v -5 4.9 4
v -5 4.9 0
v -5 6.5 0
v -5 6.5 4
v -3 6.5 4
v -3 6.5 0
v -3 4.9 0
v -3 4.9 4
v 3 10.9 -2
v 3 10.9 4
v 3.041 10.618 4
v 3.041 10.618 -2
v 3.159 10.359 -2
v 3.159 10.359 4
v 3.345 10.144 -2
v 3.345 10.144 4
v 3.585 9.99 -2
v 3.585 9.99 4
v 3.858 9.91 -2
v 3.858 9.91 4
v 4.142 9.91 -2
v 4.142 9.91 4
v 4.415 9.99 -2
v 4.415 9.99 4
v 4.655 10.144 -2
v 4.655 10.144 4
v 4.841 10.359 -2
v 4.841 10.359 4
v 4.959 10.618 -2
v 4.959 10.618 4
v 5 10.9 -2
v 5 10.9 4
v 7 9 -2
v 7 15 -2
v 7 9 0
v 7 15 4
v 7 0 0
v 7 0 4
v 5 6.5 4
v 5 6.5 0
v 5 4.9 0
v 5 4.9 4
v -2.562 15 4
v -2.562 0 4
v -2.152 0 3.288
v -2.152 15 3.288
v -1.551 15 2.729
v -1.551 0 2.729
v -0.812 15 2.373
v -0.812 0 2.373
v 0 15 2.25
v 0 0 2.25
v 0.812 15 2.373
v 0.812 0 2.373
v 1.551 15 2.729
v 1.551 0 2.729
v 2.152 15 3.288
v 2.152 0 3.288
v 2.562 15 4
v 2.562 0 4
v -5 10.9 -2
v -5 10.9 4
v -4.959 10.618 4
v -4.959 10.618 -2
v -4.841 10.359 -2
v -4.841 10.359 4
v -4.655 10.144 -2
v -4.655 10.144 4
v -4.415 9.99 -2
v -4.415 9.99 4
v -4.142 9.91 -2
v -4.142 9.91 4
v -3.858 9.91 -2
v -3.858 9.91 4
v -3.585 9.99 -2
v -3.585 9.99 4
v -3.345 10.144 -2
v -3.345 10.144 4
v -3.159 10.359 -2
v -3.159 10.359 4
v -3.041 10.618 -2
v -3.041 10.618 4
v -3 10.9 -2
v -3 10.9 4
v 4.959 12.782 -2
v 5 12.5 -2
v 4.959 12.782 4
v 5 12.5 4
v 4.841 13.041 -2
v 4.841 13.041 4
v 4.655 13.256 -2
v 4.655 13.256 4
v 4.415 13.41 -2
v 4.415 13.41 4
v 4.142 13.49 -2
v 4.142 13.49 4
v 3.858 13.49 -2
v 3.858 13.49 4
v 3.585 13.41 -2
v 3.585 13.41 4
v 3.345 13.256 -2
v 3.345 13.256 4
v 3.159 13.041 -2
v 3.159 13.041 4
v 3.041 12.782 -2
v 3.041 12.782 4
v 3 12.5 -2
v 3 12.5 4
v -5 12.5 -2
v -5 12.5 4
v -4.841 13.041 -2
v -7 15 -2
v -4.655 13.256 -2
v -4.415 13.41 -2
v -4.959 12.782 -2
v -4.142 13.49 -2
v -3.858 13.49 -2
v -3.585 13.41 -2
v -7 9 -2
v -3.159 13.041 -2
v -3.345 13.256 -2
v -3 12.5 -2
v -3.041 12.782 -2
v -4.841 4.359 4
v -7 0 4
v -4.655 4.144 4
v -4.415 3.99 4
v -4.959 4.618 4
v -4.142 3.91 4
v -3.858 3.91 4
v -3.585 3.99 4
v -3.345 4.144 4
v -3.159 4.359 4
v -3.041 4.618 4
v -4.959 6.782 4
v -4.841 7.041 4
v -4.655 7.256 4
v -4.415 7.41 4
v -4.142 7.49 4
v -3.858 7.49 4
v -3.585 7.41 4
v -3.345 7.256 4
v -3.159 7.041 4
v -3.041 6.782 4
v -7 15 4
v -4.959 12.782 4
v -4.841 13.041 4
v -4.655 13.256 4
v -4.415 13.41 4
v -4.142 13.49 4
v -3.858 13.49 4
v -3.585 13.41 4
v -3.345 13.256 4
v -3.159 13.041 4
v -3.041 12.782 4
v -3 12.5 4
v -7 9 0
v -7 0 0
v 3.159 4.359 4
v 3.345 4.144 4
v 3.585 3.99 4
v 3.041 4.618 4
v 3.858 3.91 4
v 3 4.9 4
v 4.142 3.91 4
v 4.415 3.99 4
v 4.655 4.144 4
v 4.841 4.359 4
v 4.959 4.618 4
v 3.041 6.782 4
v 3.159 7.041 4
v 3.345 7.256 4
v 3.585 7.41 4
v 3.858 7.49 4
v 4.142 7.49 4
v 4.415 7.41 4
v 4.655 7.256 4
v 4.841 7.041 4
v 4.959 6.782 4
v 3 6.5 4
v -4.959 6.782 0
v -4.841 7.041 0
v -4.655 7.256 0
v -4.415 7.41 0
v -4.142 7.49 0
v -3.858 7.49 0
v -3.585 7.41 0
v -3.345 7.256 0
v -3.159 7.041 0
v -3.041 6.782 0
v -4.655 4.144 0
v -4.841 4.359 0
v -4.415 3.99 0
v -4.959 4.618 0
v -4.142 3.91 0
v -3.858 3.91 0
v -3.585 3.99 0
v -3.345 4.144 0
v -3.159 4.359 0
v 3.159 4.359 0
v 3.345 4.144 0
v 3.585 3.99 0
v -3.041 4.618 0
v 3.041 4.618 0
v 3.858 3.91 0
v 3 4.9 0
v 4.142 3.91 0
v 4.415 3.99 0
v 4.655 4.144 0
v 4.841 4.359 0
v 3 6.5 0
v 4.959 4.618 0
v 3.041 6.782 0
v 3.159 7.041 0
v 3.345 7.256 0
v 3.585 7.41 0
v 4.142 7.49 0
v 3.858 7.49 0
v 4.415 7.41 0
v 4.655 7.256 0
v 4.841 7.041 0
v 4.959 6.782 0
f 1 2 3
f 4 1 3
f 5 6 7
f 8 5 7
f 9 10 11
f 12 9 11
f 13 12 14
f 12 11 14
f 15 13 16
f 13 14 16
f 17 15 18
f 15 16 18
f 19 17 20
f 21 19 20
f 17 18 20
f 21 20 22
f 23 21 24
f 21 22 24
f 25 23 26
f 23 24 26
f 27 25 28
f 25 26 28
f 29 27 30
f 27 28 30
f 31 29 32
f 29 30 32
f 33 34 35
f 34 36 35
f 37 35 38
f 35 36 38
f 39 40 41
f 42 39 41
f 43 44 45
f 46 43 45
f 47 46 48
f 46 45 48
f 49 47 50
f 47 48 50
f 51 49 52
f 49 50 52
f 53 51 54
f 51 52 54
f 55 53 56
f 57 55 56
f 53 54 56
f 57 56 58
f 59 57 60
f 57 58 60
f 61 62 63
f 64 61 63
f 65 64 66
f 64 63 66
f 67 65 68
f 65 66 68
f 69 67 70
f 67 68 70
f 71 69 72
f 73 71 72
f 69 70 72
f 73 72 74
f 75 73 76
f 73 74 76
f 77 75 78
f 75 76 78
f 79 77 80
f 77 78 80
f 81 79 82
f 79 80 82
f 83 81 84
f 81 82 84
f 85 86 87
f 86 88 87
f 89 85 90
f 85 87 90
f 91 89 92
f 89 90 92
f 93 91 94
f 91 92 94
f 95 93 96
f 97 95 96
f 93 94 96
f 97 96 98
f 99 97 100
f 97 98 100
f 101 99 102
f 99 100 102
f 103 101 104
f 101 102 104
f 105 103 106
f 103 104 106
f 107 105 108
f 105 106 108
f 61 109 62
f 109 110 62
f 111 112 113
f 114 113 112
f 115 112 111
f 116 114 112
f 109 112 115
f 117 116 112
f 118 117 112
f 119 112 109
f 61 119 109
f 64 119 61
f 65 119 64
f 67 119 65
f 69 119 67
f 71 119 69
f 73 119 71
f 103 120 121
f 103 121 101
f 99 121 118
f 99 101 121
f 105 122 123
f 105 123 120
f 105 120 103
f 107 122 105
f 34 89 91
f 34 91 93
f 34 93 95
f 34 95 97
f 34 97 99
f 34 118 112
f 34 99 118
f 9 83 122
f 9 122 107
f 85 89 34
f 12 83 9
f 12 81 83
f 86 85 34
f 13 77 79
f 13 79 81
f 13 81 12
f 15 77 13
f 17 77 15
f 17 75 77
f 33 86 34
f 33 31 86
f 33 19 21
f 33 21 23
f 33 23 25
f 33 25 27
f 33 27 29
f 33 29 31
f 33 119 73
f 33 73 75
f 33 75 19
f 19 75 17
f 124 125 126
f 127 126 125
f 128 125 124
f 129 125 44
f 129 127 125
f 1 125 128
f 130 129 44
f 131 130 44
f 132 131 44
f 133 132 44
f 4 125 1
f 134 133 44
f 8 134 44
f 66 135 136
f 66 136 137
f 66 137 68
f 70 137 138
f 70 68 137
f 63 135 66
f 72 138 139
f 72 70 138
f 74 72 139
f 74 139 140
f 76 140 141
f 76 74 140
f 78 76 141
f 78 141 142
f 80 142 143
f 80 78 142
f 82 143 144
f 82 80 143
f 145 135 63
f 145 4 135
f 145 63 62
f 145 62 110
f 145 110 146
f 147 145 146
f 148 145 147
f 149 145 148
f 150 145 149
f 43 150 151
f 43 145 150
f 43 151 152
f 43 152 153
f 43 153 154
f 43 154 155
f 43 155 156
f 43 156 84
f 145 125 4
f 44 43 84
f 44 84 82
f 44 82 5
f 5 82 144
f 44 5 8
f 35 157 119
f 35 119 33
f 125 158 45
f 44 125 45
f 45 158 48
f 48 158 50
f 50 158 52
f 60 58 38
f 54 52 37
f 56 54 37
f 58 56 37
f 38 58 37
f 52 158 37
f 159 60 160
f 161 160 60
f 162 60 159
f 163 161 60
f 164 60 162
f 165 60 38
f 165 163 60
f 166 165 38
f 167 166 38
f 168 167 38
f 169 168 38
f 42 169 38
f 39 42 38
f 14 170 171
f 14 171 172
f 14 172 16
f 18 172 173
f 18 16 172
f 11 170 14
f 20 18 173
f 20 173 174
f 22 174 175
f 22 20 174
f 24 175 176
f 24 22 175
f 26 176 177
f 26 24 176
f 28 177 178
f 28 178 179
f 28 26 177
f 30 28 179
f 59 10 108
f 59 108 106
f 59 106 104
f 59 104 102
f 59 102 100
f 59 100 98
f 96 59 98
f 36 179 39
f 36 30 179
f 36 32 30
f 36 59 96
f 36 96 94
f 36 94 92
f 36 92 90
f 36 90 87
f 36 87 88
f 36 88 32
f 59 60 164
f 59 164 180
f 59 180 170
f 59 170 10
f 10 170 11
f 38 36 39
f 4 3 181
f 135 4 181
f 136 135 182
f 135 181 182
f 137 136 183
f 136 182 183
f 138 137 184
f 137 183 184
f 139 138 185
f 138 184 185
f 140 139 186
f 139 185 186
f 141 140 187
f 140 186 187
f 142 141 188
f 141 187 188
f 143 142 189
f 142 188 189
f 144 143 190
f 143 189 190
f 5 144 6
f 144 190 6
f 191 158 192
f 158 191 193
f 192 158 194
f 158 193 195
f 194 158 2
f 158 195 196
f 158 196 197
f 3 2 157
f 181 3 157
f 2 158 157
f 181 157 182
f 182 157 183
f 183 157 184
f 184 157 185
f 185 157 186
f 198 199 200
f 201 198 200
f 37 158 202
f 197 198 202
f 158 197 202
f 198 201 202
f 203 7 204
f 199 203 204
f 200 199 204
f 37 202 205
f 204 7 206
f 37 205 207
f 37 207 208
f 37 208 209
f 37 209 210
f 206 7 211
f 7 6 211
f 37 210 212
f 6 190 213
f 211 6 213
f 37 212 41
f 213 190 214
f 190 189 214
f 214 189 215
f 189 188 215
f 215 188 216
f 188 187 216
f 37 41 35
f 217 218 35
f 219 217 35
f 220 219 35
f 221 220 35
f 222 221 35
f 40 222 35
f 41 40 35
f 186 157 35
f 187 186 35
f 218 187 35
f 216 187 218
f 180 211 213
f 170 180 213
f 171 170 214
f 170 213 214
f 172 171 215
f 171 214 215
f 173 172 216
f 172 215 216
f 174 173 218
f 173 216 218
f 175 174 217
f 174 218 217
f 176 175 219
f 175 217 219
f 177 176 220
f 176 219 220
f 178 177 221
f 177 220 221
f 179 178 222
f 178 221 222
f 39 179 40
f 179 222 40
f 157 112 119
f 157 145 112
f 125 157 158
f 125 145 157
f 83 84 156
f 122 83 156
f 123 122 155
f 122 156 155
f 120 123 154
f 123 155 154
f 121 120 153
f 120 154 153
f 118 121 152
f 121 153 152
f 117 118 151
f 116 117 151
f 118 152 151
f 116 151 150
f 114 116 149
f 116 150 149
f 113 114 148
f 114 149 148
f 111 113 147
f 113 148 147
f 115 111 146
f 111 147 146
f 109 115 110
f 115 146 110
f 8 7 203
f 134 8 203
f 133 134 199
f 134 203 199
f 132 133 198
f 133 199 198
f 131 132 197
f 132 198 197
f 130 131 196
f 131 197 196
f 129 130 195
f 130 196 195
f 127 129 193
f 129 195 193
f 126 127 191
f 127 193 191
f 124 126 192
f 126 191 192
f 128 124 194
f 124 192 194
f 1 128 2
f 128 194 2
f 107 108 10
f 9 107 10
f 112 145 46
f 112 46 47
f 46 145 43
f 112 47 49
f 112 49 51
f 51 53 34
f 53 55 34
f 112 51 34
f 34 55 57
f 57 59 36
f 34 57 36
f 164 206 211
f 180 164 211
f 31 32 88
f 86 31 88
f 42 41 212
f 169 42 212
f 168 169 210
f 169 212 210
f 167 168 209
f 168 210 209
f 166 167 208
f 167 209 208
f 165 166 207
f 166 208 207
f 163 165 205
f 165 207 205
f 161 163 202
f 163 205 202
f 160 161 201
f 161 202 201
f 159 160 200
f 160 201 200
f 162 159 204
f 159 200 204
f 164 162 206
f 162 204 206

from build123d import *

# Parameters (mm, degrees)
F0_W     = 14
F0_H     = 15
F1_DEPTH = 4
F3_DEPTH = 15.001
F4_W     = 14
F4_H     = 6
F5_DEPTH = 2


with BuildPart() as f1:
    # F0 (on Top) → F1 (new body)
    with BuildSketch(Plane.XY):
        with Locations((0, 7.5)):
            Rectangle(F0_W, F0_H)
        with BuildLine():
            Line((-5, 4.9), (-5, 6.5))
            ThreePointArc((-5, 6.5), (-4, 7.5), (-3, 6.5))
            Line((-3, 6.5), (-3, 4.9))
            ThreePointArc((-3, 4.9), (-4, 3.9), (-5, 4.9))
        make_face(mode=Mode.SUBTRACT)
        with BuildLine():
            Line((5, 6.5), (5, 4.9))
            ThreePointArc((5, 4.9), (4, 3.9), (3, 4.9))
            Line((3, 4.9), (3, 6.5))
            ThreePointArc((3, 6.5), (4, 7.5), (5, 6.5))
        make_face(mode=Mode.SUBTRACT)
        with BuildLine():
            Line((-5, 10.9), (-5, 12.5))
            ThreePointArc((-5, 12.5), (-4, 13.5), (-3, 12.5))
            Line((-3, 12.5), (-3, 10.9))
            ThreePointArc((-3, 10.9), (-4, 9.9), (-5, 10.9))
        make_face(mode=Mode.SUBTRACT)
        with BuildLine():
            Line((3, 10.9), (3, 12.5))
            ThreePointArc((3, 12.5), (4, 13.5), (5, 12.5))
            Line((5, 12.5), (5, 10.9))
            ThreePointArc((5, 10.9), (4, 9.9), (3, 10.9))
        make_face(mode=Mode.SUBTRACT)
    extrude(amount=F1_DEPTH)

    # F2 (on face) → F3 (cut, through all)
    with BuildSketch(Plane.XZ):
        with BuildLine():
            ThreePointArc((2.75, 5), (2.702525, 4.491216), (2.561738, 4))
            Line((2.561738, 4), (2.75, 4))
            Line((2.75, 4), (2.75, 5))
        make_face()
        with BuildLine():
            Line((2.561738, 4), (-2.561738, 4))
            ThreePointArc((-2.561738, 4), (0, 2.25), (2.561738, 4))
        make_face()
        with BuildLine():
            ThreePointArc((-2.561738, 4), (-2.702525, 4.491216), (-2.75, 5))
            Line((-2.75, 5), (-2.75, 4))
            Line((-2.75, 4), (-2.561738, 4))
        make_face()
    extrude(amount=-F3_DEPTH, mode=Mode.SUBTRACT)

    # F4 (on face) → F5 (join)
    with BuildSketch(Plane(origin=(0, 0, 0), x_dir=(1, 0, 0), z_dir=(0, 0, -1))):
        with Locations((0, -12)):
            Rectangle(F4_W, F4_H)
        with BuildLine():
            ThreePointArc((-3, -12.5), (-4, -13.5), (-5, -12.5))
            Line((-5, -12.5), (-5, -10.9))
            ThreePointArc((-5, -10.9), (-4, -9.9), (-3, -10.9))
            Line((-3, -10.9), (-3, -12.5))
        make_face(mode=Mode.SUBTRACT)
        with BuildLine():
            ThreePointArc((5, -12.5), (4, -13.5), (3, -12.5))
            Line((3, -12.5), (3, -10.9))
            ThreePointArc((3, -10.9), (4, -9.9), (5, -10.9))
            Line((5, -10.9), (5, -12.5))
        make_face(mode=Mode.SUBTRACT)
    extrude(amount=F5_DEPTH)


solid = f1.part
